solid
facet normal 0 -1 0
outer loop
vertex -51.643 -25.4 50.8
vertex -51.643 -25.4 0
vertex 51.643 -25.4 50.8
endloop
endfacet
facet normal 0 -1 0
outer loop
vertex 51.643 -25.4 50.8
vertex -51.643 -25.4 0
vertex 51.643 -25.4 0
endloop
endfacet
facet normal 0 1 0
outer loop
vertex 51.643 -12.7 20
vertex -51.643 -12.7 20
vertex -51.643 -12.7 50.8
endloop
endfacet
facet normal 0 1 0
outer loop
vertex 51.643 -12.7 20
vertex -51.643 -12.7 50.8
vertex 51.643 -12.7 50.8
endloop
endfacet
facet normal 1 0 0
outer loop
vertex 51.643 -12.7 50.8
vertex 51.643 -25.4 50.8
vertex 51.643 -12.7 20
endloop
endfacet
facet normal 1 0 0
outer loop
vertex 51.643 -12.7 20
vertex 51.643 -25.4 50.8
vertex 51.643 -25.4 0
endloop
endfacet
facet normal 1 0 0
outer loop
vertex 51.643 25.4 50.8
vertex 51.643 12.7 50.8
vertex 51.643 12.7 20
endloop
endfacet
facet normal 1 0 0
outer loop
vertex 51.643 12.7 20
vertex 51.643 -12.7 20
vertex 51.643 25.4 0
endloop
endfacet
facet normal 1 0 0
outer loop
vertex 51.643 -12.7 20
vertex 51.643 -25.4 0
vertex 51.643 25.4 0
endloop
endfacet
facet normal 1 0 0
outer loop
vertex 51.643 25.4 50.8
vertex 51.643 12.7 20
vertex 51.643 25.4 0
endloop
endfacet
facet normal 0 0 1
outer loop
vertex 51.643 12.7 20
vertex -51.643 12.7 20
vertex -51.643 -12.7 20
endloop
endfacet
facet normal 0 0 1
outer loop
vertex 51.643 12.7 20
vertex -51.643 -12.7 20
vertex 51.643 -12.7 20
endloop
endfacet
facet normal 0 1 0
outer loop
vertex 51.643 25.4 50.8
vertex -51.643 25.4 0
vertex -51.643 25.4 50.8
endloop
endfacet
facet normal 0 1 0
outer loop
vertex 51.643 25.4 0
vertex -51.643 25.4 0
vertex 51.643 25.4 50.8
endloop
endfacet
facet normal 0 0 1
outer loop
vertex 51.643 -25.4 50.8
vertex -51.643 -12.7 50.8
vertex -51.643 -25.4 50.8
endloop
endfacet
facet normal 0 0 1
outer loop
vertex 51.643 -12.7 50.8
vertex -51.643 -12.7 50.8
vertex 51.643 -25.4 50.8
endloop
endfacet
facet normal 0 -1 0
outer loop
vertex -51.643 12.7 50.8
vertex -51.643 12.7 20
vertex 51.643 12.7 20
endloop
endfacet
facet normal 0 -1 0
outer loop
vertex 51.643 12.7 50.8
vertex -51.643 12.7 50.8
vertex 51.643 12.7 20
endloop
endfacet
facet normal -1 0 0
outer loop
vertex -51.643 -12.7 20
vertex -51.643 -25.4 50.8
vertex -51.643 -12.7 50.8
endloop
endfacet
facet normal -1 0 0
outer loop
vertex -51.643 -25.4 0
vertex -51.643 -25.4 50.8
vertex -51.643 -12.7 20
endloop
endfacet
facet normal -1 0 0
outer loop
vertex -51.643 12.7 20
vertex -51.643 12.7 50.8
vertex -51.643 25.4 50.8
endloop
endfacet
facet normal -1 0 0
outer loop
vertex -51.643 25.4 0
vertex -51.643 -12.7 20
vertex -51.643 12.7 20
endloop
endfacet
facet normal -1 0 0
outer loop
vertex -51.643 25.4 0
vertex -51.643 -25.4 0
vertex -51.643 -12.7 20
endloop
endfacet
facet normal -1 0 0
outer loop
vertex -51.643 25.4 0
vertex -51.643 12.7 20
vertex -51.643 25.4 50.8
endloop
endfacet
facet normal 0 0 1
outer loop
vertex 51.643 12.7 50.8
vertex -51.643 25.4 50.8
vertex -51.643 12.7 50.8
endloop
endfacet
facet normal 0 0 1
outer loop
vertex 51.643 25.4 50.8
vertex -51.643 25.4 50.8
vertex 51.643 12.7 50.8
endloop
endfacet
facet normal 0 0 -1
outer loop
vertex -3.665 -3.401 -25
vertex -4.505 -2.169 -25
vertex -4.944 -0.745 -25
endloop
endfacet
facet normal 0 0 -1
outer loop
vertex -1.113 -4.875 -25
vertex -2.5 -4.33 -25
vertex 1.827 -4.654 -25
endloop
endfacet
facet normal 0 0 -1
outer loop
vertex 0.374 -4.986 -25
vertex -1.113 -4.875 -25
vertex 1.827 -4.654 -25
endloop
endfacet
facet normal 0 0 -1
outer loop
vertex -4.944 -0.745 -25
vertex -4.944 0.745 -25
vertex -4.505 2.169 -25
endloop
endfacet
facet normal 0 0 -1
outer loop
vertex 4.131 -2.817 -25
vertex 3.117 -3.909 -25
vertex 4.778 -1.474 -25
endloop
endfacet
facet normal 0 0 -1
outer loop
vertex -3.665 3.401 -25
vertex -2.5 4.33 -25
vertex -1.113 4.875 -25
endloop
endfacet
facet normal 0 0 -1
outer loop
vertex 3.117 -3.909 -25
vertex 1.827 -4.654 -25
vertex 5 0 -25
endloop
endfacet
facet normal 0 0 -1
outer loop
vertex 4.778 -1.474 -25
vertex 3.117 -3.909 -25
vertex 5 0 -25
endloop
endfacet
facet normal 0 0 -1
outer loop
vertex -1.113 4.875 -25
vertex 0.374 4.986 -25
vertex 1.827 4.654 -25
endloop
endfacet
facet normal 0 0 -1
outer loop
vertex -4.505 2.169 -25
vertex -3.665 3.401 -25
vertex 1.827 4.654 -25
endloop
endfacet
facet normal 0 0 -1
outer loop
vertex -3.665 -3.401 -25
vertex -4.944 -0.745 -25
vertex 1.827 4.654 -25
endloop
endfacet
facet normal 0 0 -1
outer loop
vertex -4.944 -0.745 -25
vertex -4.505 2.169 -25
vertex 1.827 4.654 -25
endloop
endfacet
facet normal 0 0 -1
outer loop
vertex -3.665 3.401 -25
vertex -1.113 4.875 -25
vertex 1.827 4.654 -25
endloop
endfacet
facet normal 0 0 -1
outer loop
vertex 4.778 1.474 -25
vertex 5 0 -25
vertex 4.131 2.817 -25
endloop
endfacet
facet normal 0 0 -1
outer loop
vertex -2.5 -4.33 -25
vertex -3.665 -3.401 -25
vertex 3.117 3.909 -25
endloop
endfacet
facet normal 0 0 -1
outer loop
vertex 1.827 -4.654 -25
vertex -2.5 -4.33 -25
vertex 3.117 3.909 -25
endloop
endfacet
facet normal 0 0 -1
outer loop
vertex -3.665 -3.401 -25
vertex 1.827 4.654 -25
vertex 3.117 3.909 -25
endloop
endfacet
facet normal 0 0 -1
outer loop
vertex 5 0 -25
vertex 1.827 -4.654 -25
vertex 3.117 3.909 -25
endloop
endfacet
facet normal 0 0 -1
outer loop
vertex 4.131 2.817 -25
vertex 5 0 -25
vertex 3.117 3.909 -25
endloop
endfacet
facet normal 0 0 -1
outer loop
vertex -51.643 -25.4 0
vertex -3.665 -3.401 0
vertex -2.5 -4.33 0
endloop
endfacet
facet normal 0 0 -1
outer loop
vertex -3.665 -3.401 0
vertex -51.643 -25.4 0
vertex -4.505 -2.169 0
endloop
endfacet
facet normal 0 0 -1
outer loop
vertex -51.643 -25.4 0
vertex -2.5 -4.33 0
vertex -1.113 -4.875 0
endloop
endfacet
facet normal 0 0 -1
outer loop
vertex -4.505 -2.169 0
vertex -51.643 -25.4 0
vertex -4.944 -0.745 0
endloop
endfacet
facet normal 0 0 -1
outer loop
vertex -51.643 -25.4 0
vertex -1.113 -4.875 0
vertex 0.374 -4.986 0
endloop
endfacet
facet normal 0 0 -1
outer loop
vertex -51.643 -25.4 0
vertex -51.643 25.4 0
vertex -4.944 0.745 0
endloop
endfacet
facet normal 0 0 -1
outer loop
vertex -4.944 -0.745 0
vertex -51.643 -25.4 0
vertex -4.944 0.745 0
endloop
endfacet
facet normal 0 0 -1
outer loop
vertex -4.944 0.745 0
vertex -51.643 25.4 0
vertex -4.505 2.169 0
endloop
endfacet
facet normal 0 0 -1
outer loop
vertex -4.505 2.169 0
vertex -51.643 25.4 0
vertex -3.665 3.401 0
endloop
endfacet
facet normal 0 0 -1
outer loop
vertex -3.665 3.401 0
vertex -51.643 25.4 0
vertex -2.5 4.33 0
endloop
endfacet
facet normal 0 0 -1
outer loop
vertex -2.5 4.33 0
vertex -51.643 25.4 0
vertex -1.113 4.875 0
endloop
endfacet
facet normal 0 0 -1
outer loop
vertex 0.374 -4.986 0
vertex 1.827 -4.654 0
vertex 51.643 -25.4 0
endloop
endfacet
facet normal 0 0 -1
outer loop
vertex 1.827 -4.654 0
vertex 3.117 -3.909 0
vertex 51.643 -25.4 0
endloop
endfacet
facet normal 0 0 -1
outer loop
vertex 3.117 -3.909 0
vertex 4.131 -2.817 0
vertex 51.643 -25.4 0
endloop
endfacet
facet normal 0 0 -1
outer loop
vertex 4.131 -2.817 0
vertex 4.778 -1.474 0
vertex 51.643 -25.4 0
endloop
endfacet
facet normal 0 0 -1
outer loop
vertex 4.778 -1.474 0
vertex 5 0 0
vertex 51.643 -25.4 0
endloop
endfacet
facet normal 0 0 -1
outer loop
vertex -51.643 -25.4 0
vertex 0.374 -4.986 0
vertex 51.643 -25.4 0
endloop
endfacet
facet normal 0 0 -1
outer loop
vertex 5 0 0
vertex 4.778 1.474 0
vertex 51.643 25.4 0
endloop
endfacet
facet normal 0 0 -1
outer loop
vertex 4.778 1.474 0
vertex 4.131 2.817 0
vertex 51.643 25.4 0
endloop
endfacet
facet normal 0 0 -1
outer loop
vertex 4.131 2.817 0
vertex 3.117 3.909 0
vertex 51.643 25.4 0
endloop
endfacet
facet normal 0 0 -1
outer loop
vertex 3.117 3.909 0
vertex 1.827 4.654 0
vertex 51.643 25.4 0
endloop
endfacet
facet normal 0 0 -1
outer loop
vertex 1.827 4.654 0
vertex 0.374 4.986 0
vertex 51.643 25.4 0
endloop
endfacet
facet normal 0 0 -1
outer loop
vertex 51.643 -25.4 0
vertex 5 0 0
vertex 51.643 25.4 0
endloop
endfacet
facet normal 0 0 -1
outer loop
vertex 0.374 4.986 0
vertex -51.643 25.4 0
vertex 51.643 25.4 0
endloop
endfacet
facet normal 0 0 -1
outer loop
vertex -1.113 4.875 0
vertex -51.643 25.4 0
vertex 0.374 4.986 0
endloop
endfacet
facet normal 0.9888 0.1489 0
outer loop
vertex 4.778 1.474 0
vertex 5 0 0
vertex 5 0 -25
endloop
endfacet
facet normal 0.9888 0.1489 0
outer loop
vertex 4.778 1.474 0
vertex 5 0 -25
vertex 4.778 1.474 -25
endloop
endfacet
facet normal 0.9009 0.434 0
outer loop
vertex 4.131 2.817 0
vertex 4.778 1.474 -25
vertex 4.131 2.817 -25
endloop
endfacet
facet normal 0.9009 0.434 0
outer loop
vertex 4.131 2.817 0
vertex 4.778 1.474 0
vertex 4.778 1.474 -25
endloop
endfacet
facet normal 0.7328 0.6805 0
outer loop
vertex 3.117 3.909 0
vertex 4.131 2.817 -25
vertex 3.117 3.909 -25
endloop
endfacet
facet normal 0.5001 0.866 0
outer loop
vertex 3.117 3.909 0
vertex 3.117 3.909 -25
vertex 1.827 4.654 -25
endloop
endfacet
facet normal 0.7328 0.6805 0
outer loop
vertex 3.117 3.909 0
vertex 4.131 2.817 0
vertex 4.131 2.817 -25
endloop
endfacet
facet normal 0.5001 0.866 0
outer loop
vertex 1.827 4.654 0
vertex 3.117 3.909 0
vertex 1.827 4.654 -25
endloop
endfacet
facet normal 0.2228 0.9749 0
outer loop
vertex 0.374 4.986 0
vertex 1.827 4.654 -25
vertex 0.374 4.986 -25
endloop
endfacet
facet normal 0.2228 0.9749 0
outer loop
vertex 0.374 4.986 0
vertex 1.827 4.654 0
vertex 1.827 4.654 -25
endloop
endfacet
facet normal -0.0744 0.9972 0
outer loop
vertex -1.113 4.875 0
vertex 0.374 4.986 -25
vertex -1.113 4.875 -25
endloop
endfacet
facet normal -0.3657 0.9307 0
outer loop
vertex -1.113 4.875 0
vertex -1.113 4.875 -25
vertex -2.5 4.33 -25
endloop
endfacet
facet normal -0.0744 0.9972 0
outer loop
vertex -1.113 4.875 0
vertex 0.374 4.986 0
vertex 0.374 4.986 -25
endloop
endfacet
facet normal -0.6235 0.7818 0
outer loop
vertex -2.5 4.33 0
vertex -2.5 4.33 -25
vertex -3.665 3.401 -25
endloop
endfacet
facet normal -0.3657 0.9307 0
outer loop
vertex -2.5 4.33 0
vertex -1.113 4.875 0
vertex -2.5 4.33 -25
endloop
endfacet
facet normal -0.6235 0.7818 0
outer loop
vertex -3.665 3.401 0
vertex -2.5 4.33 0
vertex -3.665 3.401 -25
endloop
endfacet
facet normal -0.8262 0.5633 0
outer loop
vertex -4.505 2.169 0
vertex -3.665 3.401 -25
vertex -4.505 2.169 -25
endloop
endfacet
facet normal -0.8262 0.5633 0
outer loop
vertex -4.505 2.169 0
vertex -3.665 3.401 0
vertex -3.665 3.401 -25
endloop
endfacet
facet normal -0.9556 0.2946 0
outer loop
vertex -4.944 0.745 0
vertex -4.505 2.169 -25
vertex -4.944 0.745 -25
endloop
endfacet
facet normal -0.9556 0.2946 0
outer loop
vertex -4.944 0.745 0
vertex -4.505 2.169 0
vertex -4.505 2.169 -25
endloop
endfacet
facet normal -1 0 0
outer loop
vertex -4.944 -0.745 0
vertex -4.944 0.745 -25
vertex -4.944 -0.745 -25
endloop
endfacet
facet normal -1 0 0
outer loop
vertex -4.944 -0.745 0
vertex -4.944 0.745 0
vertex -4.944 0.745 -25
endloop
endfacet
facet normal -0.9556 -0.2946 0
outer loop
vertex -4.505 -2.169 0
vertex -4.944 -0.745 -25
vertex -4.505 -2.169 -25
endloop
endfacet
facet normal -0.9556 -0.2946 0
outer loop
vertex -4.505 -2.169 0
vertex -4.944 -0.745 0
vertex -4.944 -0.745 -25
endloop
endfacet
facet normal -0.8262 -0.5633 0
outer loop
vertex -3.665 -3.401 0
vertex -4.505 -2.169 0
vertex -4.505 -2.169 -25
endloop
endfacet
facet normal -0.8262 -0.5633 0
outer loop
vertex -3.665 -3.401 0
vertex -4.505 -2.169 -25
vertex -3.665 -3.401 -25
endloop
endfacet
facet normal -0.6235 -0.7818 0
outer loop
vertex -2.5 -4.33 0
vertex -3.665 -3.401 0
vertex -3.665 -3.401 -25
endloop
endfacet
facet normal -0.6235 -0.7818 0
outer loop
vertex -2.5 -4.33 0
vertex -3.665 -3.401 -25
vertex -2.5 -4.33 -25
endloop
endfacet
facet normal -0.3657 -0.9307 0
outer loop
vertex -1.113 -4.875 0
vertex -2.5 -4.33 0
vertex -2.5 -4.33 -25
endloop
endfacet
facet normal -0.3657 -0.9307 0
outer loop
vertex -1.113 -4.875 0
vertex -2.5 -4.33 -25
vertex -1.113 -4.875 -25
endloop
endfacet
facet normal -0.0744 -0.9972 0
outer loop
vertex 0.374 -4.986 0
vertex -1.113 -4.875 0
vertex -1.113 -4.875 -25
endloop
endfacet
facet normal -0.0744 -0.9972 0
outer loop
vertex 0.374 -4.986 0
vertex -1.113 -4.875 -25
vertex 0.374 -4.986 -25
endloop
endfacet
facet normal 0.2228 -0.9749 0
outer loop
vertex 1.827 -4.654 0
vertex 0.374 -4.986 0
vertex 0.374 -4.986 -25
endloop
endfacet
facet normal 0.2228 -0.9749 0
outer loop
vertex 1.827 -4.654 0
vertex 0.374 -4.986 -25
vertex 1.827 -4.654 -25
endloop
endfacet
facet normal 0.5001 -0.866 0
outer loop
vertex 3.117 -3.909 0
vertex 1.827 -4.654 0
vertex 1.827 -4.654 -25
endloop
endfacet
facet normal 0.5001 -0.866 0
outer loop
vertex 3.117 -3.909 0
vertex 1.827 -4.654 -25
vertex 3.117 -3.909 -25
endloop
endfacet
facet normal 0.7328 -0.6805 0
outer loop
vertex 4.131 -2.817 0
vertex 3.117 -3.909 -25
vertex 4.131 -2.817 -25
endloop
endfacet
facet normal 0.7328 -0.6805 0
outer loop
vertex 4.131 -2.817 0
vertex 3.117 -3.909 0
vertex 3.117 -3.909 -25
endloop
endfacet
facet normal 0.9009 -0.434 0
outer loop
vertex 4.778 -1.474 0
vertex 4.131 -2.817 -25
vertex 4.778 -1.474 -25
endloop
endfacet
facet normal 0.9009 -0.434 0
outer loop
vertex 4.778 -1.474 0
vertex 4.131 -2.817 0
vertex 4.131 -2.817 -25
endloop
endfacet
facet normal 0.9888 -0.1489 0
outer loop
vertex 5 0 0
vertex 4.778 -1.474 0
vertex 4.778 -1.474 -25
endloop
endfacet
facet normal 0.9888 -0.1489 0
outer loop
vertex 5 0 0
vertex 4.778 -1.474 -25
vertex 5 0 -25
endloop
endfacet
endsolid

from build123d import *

# Parameters (mm, degrees)
F0_W     = 103.285306
F0_H     = 12.7
F1_DEPTH = 50.8
F0_H_2   = 25.4
F2_DEPTH = 20
F3_R     = 5
F4_DEPTH = 25


with BuildPart() as f1:
    # F0 (on Top) → F1 (new body)
    with BuildSketch(Plane.XY):
        with Locations((0, 19.05)):
            Rectangle(F0_W, F0_H)
        with Locations((0, -19.05)):
            Rectangle(F0_W, F0_H)
    extrude(amount=F1_DEPTH)

    # F0 (on Top) → F2 (join)
    with BuildSketch(Plane.XY):
        Rectangle(F0_W, F0_H_2)
    extrude(amount=F2_DEPTH)

    # F3 (on face) → F4 (join)
    with BuildSketch(Plane.XY):
        Circle(F3_R)
    extrude(amount=-F4_DEPTH)


solid = f1.part
